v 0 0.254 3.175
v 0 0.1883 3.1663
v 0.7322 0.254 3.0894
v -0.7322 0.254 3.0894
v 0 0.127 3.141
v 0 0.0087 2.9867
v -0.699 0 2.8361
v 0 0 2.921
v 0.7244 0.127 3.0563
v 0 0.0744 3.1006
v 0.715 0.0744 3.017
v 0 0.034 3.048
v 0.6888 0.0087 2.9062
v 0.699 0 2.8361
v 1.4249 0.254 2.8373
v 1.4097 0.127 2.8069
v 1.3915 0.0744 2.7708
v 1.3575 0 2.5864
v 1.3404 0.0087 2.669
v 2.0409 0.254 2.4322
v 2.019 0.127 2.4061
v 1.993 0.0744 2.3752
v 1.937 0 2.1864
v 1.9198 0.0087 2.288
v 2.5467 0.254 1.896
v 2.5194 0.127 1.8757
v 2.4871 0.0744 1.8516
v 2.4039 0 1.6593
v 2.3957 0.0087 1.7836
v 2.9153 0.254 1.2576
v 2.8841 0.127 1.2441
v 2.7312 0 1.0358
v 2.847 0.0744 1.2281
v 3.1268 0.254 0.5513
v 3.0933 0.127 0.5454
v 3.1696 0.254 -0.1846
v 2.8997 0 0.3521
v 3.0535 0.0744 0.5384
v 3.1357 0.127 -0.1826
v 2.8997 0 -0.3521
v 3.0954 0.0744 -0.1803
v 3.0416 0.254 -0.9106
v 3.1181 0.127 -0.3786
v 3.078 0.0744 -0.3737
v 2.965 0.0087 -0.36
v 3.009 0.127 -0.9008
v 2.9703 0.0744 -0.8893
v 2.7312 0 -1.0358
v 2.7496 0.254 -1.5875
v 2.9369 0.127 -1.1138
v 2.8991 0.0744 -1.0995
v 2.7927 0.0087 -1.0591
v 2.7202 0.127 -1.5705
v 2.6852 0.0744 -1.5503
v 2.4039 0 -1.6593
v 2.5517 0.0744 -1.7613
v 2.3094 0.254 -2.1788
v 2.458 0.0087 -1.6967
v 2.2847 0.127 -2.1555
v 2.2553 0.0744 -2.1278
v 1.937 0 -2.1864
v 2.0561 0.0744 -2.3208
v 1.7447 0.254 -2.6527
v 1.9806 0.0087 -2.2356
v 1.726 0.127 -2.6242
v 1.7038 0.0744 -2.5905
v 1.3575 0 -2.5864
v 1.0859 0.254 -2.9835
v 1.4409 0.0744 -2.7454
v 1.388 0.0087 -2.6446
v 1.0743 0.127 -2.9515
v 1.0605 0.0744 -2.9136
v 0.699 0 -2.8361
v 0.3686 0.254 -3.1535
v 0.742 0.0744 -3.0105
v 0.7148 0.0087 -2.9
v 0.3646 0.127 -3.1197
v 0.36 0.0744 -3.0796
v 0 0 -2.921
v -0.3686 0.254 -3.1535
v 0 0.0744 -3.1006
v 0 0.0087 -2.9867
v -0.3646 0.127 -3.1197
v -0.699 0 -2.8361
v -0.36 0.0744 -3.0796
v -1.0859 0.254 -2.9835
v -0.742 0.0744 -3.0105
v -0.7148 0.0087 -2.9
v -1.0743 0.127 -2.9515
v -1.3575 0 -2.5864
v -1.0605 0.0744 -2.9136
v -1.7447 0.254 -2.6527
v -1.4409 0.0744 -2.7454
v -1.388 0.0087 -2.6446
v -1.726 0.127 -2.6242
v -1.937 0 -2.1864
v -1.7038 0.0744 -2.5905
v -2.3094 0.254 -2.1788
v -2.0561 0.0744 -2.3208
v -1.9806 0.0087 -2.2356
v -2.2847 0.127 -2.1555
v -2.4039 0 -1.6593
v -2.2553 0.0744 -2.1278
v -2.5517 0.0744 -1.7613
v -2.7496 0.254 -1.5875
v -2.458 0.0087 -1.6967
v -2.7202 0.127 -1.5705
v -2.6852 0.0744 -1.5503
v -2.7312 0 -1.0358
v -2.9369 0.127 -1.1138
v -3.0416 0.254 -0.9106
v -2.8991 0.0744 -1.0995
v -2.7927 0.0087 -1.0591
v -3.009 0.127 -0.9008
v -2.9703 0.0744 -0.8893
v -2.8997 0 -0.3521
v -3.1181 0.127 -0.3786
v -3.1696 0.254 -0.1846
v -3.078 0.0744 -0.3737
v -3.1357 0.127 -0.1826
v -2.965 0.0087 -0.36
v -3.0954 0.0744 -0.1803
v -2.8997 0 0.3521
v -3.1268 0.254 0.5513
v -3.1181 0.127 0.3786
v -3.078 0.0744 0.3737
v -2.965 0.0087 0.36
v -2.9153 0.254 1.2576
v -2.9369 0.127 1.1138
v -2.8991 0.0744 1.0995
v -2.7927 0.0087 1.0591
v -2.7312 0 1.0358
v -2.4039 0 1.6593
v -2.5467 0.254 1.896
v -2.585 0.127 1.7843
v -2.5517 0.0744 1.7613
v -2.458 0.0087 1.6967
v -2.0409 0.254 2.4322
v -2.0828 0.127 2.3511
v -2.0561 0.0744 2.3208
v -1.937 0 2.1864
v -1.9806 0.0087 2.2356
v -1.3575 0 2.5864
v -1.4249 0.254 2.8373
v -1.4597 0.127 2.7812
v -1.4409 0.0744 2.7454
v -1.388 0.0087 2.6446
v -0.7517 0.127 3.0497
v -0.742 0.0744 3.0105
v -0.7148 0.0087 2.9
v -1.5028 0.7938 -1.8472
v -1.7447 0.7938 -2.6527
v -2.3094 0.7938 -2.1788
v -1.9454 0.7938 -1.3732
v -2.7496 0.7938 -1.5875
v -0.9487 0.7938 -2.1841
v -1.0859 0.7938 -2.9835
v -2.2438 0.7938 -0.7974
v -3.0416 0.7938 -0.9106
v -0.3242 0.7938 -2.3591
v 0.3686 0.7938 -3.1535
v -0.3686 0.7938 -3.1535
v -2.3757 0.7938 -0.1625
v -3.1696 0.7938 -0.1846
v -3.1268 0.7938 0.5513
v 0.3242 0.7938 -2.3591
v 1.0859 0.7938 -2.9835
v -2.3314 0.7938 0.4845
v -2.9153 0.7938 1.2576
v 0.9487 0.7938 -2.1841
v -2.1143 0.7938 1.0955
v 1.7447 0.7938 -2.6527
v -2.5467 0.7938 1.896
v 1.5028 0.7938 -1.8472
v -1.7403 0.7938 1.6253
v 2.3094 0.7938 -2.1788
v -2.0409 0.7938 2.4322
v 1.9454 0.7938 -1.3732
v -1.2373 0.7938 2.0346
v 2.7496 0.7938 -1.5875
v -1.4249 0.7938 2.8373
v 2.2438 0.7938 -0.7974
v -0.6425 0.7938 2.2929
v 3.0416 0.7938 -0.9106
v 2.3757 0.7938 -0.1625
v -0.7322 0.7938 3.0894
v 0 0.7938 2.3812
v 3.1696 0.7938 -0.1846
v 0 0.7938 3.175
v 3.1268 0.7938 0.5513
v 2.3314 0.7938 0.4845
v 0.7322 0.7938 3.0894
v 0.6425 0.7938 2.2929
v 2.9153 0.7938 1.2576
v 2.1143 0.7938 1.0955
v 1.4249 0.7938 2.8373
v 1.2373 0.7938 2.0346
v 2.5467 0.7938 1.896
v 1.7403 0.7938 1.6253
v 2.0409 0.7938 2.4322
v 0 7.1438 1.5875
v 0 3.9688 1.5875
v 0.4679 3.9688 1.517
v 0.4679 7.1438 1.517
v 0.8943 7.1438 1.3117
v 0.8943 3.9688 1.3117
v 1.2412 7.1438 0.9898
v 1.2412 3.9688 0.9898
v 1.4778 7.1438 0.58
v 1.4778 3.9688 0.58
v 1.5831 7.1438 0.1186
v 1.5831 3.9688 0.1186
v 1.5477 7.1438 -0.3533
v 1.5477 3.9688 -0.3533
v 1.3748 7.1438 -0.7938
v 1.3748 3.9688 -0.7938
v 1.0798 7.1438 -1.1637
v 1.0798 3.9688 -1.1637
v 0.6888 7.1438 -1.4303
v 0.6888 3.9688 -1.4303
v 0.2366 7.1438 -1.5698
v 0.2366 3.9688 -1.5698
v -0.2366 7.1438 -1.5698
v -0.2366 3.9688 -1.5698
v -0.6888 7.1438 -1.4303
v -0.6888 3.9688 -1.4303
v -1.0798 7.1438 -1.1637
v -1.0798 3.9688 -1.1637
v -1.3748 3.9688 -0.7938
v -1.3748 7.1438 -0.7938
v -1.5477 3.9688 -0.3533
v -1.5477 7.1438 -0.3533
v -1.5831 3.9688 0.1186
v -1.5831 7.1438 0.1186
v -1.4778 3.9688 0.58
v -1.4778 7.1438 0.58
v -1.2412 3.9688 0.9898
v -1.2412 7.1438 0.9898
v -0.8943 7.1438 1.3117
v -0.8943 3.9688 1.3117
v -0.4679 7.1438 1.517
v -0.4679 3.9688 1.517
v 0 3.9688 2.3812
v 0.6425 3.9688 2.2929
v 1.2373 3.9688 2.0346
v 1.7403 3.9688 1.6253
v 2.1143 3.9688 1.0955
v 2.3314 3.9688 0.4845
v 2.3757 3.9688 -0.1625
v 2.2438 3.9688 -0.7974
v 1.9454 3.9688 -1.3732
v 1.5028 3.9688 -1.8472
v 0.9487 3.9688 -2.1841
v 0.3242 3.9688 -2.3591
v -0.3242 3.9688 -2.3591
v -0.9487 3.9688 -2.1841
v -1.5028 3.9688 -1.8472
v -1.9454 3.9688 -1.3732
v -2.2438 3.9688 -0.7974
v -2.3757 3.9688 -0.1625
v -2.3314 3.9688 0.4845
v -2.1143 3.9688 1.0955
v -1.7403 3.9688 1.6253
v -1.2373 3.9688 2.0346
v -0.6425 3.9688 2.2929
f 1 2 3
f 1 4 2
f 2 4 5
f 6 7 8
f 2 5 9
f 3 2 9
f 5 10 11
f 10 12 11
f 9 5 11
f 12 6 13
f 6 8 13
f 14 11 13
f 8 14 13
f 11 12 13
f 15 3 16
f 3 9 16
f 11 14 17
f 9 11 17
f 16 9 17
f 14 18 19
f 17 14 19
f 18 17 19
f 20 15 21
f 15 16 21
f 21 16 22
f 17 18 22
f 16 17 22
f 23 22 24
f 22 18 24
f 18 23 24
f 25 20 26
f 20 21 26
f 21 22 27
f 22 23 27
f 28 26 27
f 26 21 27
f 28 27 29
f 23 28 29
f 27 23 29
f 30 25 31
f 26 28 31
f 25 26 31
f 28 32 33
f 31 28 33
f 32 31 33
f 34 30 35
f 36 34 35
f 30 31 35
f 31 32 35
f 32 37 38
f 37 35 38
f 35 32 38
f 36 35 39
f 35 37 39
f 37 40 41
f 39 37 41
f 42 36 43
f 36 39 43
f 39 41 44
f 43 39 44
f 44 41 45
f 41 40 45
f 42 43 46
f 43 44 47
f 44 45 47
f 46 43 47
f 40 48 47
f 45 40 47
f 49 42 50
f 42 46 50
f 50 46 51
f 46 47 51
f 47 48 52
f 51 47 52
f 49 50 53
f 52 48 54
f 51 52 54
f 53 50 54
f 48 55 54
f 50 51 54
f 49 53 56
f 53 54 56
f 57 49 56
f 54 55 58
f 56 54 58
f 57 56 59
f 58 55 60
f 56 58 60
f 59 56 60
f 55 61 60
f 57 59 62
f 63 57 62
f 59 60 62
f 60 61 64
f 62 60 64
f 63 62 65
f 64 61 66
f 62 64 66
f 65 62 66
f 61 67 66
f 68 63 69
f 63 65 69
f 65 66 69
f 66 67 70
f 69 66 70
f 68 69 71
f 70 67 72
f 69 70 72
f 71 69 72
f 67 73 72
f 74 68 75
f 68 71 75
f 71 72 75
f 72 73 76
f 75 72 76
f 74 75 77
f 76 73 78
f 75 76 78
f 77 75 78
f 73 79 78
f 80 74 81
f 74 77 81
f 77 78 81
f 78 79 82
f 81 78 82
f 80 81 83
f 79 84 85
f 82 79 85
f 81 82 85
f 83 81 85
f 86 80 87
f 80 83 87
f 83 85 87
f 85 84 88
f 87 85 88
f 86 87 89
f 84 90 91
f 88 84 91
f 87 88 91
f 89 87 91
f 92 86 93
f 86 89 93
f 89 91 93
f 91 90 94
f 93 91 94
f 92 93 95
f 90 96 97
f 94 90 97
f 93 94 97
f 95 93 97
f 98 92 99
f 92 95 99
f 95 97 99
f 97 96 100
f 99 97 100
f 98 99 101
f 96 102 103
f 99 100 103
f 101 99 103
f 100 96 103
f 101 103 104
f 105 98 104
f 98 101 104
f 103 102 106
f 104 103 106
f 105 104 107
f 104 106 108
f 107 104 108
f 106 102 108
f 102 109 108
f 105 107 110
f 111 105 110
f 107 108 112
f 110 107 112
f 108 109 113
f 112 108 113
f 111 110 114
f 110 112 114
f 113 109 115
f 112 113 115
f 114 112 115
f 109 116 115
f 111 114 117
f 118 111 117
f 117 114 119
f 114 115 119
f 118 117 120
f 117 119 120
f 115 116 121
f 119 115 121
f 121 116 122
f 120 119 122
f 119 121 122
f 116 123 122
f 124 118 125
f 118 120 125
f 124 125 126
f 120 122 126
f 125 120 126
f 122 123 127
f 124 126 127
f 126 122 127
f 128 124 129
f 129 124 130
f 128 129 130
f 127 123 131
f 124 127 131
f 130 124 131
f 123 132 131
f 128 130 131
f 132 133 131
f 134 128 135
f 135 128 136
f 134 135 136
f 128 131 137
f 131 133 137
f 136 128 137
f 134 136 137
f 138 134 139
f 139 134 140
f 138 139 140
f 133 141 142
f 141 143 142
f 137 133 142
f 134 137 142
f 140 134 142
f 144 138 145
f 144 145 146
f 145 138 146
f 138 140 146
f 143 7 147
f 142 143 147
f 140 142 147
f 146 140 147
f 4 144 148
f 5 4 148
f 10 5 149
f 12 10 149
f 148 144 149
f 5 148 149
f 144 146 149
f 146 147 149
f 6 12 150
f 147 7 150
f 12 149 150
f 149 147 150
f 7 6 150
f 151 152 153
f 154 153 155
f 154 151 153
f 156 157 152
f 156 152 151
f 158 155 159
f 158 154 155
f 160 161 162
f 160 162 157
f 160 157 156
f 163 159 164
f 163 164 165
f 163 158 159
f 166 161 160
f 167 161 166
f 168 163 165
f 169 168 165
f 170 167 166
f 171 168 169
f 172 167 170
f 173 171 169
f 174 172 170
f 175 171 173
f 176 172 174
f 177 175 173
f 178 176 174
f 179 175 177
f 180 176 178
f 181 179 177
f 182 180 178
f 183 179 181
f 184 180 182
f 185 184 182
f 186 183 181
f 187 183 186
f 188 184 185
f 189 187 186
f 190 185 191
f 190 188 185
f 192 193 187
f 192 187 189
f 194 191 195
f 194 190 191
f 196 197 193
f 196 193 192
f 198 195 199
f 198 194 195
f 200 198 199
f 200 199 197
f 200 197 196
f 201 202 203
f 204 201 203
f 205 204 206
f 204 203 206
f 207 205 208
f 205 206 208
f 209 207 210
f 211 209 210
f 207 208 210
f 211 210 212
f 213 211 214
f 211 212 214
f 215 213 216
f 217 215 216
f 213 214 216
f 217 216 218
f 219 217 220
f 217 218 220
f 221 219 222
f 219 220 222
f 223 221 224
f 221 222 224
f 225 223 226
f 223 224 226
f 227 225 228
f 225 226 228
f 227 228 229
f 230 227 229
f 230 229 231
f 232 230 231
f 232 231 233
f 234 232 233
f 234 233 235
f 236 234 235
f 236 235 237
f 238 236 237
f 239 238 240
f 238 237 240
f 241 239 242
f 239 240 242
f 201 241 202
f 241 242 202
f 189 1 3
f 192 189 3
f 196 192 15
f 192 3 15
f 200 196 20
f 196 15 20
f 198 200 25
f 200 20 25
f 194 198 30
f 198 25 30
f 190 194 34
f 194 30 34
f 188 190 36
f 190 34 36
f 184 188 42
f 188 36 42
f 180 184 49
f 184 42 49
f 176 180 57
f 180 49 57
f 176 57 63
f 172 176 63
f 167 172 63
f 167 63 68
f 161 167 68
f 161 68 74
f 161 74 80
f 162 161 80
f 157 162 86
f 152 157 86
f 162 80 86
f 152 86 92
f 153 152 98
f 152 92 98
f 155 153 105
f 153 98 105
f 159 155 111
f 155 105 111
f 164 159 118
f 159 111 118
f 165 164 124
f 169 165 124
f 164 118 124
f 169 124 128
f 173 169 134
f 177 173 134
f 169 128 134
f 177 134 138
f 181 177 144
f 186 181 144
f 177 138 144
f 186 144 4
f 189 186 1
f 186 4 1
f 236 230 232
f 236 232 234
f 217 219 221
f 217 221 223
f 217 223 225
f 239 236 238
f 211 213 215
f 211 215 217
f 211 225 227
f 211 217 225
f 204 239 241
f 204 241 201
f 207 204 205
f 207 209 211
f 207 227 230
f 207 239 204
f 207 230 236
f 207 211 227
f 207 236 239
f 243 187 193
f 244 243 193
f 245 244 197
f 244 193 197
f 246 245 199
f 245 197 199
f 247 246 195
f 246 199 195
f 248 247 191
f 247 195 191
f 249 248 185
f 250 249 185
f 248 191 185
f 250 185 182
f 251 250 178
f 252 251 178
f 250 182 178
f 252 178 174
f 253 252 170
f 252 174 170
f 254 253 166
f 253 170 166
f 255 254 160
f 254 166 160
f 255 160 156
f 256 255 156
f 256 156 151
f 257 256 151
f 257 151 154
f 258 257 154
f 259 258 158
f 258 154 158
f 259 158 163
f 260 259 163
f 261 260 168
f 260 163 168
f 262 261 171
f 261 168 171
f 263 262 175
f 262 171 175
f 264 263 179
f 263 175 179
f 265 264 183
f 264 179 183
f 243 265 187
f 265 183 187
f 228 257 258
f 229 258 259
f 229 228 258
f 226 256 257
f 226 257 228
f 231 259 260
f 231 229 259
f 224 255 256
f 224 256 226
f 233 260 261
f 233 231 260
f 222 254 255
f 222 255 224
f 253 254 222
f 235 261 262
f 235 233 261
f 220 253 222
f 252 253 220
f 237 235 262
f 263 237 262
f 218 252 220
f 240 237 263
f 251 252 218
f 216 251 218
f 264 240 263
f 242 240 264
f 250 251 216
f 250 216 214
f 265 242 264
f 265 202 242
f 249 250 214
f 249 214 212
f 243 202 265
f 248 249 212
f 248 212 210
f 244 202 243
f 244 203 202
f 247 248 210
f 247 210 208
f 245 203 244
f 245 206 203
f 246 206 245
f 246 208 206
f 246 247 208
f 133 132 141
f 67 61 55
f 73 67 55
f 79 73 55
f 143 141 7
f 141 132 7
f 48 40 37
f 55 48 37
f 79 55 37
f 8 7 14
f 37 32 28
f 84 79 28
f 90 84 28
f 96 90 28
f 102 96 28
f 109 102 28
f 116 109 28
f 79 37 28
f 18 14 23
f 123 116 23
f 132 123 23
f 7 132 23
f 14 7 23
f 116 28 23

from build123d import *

# Parameters (mm, degrees)
SKETCH1_R           = 3.175
BOSS_EXTRUDE1_DEPTH = 0.79375
SKETCH2_R           = 2.38125
BOSS_EXTRUDE2_DEPTH = 3.175
SKETCH3_R           = 1.5875
BOSS_EXTRUDE3_DEPTH = 3.175
FILLET1_R           = 0.254


with BuildPart() as part:
    # Sketch1 → Boss-Extrude1 (new body)
    with BuildSketch(Plane(origin=(0, 0, 0), x_dir=(1, 0, 0), z_dir=(0, 1, 0))):
        Circle(SKETCH1_R)
    extrude(amount=BOSS_EXTRUDE1_DEPTH)

    # Sketch2 → Boss-Extrude2 (add)
    with BuildSketch(Plane(origin=(0, 0.79375, 0), x_dir=(1, 0, 0), z_dir=(0, 1, 0))):
        Circle(SKETCH2_R)
    extrude(amount=BOSS_EXTRUDE2_DEPTH)

    # Sketch3 → Boss-Extrude3 (add)
    with BuildSketch(Plane(origin=(0, 3.96875, 0), x_dir=(1, 0, 0), z_dir=(0, 1, 0))):
        Circle(SKETCH3_R)
    extrude(amount=BOSS_EXTRUDE3_DEPTH)

    # Fillet1
    fillet1_edges = [part.edges().sort_by_distance(p)[0] for p in [
        (-3.175, 0, 0),
    ]]
    fillet(fillet1_edges, radius=FILLET1_R)


solid = part.part
